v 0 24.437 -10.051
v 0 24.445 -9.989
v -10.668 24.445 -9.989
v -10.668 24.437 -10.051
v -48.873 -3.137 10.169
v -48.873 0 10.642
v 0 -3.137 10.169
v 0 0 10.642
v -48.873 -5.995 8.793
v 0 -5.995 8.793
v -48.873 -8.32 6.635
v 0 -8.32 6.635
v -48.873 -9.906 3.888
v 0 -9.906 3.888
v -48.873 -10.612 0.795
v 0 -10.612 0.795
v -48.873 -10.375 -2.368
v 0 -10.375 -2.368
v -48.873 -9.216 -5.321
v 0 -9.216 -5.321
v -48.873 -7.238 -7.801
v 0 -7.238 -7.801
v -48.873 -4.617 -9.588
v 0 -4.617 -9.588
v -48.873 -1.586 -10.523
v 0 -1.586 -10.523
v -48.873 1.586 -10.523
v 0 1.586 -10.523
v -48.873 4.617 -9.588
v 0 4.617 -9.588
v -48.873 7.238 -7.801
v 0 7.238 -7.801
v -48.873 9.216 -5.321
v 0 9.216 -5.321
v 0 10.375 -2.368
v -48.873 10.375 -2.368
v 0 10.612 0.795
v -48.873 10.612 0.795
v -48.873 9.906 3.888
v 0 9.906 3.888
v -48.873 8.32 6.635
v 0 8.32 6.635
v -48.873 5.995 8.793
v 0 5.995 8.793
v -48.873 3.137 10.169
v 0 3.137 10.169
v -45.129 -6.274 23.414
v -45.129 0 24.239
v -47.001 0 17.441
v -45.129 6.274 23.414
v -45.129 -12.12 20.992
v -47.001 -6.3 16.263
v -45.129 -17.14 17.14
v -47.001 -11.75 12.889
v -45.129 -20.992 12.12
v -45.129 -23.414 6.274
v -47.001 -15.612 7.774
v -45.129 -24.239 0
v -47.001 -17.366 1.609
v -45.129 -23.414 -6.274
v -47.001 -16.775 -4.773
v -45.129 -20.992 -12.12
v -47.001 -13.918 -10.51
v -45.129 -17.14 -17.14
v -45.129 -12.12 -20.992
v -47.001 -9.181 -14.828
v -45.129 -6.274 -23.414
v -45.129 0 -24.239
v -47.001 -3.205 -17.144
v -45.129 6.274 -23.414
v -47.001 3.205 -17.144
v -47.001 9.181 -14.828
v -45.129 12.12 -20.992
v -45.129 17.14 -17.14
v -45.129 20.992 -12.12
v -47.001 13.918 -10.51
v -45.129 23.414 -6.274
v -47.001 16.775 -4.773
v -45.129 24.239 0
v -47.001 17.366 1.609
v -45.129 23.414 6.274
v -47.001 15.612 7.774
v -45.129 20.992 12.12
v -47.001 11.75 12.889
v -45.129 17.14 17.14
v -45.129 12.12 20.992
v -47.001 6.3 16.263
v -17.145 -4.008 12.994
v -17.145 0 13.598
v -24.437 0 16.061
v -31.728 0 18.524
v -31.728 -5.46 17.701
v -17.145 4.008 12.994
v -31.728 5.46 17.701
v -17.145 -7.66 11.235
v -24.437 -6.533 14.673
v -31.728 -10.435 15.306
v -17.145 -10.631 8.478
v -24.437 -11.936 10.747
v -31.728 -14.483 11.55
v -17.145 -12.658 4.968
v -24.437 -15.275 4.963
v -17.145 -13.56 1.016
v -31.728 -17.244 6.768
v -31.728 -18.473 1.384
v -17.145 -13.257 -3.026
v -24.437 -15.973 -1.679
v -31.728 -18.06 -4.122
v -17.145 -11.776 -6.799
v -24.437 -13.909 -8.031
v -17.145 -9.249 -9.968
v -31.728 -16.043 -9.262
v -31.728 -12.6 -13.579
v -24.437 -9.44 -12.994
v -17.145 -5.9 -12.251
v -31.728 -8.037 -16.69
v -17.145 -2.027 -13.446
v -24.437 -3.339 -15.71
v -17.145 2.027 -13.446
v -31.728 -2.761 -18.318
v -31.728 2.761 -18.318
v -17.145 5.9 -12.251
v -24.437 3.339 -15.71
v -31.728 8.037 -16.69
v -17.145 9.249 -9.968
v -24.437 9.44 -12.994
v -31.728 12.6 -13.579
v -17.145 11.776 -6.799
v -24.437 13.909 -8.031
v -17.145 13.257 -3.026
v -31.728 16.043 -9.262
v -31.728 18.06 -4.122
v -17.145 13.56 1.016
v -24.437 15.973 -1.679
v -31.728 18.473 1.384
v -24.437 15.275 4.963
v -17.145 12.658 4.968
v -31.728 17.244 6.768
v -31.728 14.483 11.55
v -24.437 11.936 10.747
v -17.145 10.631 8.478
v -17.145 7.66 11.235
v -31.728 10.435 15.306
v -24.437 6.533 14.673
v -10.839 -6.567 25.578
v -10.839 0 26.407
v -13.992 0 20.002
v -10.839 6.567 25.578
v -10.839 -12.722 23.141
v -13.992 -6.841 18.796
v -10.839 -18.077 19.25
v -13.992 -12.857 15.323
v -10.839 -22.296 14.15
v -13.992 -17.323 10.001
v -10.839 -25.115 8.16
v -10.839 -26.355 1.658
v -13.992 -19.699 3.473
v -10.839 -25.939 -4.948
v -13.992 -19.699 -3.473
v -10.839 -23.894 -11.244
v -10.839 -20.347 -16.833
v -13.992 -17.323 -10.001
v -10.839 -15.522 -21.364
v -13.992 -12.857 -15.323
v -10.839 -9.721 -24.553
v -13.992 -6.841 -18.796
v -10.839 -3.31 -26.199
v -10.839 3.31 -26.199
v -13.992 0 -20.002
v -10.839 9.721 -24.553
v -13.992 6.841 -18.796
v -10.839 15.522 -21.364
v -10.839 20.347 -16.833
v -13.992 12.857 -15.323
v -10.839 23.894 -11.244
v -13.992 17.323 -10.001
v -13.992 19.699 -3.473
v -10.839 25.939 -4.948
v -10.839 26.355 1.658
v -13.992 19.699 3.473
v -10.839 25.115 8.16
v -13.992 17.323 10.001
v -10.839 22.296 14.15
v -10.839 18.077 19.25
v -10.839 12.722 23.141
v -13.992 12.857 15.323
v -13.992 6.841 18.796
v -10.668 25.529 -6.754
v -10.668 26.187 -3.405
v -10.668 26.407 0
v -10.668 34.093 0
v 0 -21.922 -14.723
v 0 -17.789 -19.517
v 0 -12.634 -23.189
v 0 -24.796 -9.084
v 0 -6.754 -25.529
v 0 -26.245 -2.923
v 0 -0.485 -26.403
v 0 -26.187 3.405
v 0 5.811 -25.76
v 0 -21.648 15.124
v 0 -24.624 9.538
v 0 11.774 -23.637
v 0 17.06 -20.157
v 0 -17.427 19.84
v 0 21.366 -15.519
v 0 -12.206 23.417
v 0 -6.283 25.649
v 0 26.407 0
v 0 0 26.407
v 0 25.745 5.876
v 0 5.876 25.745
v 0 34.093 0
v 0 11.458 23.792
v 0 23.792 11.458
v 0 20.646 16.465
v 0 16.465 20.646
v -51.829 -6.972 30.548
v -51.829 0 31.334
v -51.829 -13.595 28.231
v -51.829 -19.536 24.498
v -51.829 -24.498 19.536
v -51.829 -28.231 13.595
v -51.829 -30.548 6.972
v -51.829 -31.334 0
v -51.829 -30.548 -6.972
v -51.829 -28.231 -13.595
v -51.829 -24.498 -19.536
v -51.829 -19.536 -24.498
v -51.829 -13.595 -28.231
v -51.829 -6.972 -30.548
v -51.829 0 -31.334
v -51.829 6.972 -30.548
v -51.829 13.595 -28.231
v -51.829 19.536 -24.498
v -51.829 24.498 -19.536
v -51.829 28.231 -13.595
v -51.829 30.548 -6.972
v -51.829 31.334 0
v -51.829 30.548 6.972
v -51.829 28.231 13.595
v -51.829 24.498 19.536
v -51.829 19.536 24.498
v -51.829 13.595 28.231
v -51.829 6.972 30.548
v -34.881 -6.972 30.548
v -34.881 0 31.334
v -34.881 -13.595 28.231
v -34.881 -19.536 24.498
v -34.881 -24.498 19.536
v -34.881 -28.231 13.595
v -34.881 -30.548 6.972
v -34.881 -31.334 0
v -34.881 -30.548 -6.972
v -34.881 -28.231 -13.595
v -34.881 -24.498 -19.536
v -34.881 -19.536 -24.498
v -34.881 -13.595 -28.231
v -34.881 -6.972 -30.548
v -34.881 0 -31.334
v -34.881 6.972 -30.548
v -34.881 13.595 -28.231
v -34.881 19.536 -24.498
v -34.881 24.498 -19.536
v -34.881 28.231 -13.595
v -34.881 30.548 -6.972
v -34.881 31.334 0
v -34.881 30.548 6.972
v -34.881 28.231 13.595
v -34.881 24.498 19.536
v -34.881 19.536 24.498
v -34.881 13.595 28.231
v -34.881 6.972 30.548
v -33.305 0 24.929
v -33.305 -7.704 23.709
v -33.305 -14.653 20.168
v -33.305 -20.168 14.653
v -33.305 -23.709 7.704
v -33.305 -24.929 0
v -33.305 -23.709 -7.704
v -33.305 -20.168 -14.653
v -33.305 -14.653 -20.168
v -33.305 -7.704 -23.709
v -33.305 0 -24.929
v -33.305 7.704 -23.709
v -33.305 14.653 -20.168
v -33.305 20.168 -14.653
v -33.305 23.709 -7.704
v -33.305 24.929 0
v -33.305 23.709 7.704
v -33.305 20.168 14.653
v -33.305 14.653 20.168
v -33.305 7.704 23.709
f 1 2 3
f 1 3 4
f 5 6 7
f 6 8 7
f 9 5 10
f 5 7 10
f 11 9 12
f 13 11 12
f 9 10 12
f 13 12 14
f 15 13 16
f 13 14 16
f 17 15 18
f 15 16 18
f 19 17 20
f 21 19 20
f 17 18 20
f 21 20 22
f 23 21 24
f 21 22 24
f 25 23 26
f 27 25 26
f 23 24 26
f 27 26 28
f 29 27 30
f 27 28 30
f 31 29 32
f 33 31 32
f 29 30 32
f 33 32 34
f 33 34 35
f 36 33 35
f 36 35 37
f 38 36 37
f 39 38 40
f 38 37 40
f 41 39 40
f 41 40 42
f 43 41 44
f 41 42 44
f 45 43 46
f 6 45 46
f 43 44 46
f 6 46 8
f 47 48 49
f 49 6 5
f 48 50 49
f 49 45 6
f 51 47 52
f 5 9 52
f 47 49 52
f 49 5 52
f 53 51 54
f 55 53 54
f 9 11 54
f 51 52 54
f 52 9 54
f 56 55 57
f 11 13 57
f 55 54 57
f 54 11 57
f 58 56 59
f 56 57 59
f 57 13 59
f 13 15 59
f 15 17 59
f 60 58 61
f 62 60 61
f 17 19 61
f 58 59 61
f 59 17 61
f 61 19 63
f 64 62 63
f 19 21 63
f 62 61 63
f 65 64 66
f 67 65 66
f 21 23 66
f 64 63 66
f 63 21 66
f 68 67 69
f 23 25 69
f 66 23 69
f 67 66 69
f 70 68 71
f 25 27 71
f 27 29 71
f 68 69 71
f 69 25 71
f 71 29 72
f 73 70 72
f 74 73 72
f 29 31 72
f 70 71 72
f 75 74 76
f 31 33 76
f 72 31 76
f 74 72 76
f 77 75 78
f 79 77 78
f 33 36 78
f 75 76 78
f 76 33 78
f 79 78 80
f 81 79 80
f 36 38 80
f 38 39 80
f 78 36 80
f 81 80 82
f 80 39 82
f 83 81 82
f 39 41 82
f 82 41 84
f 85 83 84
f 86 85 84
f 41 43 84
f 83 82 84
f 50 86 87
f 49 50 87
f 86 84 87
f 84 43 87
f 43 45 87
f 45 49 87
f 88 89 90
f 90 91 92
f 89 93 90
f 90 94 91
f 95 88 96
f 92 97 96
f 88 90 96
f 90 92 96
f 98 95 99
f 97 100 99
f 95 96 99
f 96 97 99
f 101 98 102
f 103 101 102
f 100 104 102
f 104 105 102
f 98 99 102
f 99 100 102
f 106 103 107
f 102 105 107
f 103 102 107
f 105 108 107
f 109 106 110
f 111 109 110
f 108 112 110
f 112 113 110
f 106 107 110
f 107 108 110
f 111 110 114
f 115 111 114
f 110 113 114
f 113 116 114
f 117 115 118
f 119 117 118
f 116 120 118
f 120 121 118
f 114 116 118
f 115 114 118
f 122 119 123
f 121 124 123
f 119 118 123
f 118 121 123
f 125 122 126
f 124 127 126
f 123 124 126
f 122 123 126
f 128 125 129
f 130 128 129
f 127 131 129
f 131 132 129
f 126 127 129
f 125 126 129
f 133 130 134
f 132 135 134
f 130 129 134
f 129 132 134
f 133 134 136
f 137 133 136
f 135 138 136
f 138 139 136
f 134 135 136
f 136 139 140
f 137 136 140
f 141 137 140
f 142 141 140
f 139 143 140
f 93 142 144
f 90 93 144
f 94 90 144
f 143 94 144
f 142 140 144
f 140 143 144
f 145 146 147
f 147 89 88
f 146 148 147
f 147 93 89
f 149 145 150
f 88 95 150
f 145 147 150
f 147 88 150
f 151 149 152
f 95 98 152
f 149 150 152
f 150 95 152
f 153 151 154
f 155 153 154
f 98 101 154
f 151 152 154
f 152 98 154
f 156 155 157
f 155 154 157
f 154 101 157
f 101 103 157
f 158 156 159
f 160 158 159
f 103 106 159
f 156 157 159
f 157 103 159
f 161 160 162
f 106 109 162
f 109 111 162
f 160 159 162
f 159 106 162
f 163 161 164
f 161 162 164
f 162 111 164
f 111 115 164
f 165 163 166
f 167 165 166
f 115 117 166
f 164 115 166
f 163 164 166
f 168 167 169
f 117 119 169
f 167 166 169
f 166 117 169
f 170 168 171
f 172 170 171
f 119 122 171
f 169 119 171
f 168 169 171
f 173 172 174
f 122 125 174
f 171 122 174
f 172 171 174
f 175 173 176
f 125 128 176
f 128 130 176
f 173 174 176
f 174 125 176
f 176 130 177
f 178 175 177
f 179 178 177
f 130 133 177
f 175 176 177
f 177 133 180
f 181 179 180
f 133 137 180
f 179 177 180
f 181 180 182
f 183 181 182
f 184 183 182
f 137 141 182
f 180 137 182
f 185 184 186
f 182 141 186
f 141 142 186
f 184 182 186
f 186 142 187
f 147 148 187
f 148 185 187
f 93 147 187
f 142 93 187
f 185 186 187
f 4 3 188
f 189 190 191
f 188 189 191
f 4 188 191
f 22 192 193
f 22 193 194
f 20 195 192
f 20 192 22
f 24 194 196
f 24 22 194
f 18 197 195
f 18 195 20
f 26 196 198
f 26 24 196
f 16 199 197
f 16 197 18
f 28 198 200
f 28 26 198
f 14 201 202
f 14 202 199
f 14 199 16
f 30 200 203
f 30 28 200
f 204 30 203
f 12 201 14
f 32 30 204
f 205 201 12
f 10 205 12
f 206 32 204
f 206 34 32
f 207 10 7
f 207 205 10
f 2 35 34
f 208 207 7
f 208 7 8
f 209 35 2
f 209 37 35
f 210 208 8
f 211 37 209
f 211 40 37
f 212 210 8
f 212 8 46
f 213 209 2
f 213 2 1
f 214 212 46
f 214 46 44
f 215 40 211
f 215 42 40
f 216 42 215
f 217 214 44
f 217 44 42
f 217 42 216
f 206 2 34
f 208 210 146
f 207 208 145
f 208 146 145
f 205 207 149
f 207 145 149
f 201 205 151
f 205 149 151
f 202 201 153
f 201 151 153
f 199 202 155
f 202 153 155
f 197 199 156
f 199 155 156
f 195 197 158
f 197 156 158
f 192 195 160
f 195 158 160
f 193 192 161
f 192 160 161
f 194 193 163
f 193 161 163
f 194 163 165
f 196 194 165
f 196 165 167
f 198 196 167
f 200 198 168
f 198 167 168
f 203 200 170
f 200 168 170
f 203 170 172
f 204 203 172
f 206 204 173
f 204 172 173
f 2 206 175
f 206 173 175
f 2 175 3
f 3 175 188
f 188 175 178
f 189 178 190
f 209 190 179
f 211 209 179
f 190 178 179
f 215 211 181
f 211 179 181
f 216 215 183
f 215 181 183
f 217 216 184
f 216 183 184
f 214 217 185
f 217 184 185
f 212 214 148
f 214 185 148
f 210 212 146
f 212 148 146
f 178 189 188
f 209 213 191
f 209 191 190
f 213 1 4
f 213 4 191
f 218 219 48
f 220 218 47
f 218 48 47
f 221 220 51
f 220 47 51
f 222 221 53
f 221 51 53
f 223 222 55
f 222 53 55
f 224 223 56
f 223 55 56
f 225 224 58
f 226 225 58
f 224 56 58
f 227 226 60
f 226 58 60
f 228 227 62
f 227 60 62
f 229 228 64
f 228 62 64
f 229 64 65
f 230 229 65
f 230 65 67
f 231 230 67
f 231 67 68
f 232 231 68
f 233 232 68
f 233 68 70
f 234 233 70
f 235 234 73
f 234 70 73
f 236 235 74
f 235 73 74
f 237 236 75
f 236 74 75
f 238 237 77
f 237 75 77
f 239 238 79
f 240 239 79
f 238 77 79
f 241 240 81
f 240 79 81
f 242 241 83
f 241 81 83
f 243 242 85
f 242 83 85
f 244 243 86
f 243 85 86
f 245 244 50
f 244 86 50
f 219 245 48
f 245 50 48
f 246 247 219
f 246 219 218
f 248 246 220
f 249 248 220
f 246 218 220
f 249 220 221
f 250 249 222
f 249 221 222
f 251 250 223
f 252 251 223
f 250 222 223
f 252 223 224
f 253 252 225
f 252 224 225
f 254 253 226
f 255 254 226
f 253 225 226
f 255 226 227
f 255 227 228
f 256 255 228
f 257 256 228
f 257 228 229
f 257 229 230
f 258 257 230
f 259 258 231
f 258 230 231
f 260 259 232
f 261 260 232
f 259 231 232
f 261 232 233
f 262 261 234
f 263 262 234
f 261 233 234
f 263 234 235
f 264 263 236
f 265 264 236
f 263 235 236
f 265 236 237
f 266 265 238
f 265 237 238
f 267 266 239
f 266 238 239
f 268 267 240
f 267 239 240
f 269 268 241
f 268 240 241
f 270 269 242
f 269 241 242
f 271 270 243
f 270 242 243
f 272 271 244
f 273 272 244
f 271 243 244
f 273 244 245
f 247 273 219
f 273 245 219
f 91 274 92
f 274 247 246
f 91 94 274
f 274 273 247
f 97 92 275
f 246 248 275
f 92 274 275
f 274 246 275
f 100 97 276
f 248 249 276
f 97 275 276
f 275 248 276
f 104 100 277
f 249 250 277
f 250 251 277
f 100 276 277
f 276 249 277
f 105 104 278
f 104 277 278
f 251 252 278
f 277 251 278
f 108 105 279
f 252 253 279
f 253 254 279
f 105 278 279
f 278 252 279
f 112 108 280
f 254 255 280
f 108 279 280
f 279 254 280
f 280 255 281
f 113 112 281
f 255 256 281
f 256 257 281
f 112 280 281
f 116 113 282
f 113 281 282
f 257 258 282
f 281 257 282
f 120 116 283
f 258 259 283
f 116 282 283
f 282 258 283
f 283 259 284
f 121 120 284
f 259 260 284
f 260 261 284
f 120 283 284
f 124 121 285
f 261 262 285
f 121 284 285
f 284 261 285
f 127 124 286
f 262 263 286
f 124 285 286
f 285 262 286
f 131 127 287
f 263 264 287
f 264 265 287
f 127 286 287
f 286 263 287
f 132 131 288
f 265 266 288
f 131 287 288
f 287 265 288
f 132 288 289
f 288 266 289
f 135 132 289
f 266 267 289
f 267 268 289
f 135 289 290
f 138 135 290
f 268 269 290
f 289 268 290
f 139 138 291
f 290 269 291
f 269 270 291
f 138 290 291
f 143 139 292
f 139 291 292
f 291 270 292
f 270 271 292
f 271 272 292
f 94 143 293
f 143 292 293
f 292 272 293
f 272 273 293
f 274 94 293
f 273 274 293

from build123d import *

# Parameters (mm, degrees)
F4_DEPTH = 10.668


with BuildPart() as f2:
    # F0 (on Front) → F2 (revolve)
    with BuildSketch(Plane.XZ):
        Polygon((-45.128793, 24.239482), (-48.873104, 10.641724), (0, 10.641724), (0, 26.40724), (-10.838794, 26.40724), (-17.145, 13.597758), (-31.728104, 18.524483), (-34.881208, 31.333964), (-51.829137, 31.333964), align=None)
    revolve(axis=Axis((-26.604312, 0, 0), (1, 0, 0)))

    # F3 (on Right) → F4 (join)
    with BuildSketch(Plane.YZ):
        Polygon((34.092929, 0), (25.816033, 0), (24.436556, -10.050518), align=None)
    extrude(amount=-F4_DEPTH)


solid = f2.part
